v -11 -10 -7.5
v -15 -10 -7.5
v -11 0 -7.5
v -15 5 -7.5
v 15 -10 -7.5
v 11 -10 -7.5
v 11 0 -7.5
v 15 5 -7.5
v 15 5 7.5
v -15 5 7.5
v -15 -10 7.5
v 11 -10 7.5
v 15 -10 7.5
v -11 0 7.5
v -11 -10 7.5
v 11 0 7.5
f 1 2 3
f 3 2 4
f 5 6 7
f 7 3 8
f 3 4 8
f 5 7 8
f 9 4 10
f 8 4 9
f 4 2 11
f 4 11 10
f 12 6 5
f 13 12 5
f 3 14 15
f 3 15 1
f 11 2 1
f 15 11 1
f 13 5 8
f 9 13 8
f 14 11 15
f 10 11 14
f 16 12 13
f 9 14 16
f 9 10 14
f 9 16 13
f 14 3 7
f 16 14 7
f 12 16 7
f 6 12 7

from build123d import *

# Parameters (mm, degrees)
SKETCH2_W                = 4
SKETCH2_H                = 15
BOSS_EXTRUDE1_DEPTH      = 10
BOSS_EXTRUDE1_2_DEPTH    = 10
BOSS_EXTRUDE2_DEPTH      = 7.5
BOSS_EXTRUDE2_DEPTH_BACK = 7.5
SKETCH3_W                = 30
SKETCH3_H                = 5


with BuildPart() as part:
    # Sketch2 → Boss-Extrude1 (new body)
    with BuildSketch(Plane(origin=(0, 0, 0), x_dir=(1, 0, 0), z_dir=(0, 1, 0))):
        with Locations((-13, 0)):
            Rectangle(SKETCH2_W, SKETCH2_H)
    extrude(amount=-BOSS_EXTRUDE1_DEPTH)



with BuildPart() as body_2:
    # Sketch2 → Boss-Extrude1 2 (new body)
    with BuildSketch(Plane(origin=(0, 0, 0), x_dir=(1, 0, 0), z_dir=(0, 1, 0))):
        with Locations((13, 0)):
            Rectangle(SKETCH2_W, SKETCH2_H)
    extrude(amount=-BOSS_EXTRUDE1_2_DEPTH)


with BuildPart() as part_1:
    add(part.part)

    add(body_2.part)  # Boss-Extrude2 merges body 2
    # Sketch3 → Boss-Extrude2 (add, two sides: drawn at the far end of the back side and taken through both)
    with BuildSketch(Plane.XY.offset(-BOSS_EXTRUDE2_DEPTH_BACK)):
        with Locations((0, 2.5)):
            Rectangle(SKETCH3_W, SKETCH3_H)
    extrude(amount=BOSS_EXTRUDE2_DEPTH + BOSS_EXTRUDE2_DEPTH_BACK)


solid = part_1.part
